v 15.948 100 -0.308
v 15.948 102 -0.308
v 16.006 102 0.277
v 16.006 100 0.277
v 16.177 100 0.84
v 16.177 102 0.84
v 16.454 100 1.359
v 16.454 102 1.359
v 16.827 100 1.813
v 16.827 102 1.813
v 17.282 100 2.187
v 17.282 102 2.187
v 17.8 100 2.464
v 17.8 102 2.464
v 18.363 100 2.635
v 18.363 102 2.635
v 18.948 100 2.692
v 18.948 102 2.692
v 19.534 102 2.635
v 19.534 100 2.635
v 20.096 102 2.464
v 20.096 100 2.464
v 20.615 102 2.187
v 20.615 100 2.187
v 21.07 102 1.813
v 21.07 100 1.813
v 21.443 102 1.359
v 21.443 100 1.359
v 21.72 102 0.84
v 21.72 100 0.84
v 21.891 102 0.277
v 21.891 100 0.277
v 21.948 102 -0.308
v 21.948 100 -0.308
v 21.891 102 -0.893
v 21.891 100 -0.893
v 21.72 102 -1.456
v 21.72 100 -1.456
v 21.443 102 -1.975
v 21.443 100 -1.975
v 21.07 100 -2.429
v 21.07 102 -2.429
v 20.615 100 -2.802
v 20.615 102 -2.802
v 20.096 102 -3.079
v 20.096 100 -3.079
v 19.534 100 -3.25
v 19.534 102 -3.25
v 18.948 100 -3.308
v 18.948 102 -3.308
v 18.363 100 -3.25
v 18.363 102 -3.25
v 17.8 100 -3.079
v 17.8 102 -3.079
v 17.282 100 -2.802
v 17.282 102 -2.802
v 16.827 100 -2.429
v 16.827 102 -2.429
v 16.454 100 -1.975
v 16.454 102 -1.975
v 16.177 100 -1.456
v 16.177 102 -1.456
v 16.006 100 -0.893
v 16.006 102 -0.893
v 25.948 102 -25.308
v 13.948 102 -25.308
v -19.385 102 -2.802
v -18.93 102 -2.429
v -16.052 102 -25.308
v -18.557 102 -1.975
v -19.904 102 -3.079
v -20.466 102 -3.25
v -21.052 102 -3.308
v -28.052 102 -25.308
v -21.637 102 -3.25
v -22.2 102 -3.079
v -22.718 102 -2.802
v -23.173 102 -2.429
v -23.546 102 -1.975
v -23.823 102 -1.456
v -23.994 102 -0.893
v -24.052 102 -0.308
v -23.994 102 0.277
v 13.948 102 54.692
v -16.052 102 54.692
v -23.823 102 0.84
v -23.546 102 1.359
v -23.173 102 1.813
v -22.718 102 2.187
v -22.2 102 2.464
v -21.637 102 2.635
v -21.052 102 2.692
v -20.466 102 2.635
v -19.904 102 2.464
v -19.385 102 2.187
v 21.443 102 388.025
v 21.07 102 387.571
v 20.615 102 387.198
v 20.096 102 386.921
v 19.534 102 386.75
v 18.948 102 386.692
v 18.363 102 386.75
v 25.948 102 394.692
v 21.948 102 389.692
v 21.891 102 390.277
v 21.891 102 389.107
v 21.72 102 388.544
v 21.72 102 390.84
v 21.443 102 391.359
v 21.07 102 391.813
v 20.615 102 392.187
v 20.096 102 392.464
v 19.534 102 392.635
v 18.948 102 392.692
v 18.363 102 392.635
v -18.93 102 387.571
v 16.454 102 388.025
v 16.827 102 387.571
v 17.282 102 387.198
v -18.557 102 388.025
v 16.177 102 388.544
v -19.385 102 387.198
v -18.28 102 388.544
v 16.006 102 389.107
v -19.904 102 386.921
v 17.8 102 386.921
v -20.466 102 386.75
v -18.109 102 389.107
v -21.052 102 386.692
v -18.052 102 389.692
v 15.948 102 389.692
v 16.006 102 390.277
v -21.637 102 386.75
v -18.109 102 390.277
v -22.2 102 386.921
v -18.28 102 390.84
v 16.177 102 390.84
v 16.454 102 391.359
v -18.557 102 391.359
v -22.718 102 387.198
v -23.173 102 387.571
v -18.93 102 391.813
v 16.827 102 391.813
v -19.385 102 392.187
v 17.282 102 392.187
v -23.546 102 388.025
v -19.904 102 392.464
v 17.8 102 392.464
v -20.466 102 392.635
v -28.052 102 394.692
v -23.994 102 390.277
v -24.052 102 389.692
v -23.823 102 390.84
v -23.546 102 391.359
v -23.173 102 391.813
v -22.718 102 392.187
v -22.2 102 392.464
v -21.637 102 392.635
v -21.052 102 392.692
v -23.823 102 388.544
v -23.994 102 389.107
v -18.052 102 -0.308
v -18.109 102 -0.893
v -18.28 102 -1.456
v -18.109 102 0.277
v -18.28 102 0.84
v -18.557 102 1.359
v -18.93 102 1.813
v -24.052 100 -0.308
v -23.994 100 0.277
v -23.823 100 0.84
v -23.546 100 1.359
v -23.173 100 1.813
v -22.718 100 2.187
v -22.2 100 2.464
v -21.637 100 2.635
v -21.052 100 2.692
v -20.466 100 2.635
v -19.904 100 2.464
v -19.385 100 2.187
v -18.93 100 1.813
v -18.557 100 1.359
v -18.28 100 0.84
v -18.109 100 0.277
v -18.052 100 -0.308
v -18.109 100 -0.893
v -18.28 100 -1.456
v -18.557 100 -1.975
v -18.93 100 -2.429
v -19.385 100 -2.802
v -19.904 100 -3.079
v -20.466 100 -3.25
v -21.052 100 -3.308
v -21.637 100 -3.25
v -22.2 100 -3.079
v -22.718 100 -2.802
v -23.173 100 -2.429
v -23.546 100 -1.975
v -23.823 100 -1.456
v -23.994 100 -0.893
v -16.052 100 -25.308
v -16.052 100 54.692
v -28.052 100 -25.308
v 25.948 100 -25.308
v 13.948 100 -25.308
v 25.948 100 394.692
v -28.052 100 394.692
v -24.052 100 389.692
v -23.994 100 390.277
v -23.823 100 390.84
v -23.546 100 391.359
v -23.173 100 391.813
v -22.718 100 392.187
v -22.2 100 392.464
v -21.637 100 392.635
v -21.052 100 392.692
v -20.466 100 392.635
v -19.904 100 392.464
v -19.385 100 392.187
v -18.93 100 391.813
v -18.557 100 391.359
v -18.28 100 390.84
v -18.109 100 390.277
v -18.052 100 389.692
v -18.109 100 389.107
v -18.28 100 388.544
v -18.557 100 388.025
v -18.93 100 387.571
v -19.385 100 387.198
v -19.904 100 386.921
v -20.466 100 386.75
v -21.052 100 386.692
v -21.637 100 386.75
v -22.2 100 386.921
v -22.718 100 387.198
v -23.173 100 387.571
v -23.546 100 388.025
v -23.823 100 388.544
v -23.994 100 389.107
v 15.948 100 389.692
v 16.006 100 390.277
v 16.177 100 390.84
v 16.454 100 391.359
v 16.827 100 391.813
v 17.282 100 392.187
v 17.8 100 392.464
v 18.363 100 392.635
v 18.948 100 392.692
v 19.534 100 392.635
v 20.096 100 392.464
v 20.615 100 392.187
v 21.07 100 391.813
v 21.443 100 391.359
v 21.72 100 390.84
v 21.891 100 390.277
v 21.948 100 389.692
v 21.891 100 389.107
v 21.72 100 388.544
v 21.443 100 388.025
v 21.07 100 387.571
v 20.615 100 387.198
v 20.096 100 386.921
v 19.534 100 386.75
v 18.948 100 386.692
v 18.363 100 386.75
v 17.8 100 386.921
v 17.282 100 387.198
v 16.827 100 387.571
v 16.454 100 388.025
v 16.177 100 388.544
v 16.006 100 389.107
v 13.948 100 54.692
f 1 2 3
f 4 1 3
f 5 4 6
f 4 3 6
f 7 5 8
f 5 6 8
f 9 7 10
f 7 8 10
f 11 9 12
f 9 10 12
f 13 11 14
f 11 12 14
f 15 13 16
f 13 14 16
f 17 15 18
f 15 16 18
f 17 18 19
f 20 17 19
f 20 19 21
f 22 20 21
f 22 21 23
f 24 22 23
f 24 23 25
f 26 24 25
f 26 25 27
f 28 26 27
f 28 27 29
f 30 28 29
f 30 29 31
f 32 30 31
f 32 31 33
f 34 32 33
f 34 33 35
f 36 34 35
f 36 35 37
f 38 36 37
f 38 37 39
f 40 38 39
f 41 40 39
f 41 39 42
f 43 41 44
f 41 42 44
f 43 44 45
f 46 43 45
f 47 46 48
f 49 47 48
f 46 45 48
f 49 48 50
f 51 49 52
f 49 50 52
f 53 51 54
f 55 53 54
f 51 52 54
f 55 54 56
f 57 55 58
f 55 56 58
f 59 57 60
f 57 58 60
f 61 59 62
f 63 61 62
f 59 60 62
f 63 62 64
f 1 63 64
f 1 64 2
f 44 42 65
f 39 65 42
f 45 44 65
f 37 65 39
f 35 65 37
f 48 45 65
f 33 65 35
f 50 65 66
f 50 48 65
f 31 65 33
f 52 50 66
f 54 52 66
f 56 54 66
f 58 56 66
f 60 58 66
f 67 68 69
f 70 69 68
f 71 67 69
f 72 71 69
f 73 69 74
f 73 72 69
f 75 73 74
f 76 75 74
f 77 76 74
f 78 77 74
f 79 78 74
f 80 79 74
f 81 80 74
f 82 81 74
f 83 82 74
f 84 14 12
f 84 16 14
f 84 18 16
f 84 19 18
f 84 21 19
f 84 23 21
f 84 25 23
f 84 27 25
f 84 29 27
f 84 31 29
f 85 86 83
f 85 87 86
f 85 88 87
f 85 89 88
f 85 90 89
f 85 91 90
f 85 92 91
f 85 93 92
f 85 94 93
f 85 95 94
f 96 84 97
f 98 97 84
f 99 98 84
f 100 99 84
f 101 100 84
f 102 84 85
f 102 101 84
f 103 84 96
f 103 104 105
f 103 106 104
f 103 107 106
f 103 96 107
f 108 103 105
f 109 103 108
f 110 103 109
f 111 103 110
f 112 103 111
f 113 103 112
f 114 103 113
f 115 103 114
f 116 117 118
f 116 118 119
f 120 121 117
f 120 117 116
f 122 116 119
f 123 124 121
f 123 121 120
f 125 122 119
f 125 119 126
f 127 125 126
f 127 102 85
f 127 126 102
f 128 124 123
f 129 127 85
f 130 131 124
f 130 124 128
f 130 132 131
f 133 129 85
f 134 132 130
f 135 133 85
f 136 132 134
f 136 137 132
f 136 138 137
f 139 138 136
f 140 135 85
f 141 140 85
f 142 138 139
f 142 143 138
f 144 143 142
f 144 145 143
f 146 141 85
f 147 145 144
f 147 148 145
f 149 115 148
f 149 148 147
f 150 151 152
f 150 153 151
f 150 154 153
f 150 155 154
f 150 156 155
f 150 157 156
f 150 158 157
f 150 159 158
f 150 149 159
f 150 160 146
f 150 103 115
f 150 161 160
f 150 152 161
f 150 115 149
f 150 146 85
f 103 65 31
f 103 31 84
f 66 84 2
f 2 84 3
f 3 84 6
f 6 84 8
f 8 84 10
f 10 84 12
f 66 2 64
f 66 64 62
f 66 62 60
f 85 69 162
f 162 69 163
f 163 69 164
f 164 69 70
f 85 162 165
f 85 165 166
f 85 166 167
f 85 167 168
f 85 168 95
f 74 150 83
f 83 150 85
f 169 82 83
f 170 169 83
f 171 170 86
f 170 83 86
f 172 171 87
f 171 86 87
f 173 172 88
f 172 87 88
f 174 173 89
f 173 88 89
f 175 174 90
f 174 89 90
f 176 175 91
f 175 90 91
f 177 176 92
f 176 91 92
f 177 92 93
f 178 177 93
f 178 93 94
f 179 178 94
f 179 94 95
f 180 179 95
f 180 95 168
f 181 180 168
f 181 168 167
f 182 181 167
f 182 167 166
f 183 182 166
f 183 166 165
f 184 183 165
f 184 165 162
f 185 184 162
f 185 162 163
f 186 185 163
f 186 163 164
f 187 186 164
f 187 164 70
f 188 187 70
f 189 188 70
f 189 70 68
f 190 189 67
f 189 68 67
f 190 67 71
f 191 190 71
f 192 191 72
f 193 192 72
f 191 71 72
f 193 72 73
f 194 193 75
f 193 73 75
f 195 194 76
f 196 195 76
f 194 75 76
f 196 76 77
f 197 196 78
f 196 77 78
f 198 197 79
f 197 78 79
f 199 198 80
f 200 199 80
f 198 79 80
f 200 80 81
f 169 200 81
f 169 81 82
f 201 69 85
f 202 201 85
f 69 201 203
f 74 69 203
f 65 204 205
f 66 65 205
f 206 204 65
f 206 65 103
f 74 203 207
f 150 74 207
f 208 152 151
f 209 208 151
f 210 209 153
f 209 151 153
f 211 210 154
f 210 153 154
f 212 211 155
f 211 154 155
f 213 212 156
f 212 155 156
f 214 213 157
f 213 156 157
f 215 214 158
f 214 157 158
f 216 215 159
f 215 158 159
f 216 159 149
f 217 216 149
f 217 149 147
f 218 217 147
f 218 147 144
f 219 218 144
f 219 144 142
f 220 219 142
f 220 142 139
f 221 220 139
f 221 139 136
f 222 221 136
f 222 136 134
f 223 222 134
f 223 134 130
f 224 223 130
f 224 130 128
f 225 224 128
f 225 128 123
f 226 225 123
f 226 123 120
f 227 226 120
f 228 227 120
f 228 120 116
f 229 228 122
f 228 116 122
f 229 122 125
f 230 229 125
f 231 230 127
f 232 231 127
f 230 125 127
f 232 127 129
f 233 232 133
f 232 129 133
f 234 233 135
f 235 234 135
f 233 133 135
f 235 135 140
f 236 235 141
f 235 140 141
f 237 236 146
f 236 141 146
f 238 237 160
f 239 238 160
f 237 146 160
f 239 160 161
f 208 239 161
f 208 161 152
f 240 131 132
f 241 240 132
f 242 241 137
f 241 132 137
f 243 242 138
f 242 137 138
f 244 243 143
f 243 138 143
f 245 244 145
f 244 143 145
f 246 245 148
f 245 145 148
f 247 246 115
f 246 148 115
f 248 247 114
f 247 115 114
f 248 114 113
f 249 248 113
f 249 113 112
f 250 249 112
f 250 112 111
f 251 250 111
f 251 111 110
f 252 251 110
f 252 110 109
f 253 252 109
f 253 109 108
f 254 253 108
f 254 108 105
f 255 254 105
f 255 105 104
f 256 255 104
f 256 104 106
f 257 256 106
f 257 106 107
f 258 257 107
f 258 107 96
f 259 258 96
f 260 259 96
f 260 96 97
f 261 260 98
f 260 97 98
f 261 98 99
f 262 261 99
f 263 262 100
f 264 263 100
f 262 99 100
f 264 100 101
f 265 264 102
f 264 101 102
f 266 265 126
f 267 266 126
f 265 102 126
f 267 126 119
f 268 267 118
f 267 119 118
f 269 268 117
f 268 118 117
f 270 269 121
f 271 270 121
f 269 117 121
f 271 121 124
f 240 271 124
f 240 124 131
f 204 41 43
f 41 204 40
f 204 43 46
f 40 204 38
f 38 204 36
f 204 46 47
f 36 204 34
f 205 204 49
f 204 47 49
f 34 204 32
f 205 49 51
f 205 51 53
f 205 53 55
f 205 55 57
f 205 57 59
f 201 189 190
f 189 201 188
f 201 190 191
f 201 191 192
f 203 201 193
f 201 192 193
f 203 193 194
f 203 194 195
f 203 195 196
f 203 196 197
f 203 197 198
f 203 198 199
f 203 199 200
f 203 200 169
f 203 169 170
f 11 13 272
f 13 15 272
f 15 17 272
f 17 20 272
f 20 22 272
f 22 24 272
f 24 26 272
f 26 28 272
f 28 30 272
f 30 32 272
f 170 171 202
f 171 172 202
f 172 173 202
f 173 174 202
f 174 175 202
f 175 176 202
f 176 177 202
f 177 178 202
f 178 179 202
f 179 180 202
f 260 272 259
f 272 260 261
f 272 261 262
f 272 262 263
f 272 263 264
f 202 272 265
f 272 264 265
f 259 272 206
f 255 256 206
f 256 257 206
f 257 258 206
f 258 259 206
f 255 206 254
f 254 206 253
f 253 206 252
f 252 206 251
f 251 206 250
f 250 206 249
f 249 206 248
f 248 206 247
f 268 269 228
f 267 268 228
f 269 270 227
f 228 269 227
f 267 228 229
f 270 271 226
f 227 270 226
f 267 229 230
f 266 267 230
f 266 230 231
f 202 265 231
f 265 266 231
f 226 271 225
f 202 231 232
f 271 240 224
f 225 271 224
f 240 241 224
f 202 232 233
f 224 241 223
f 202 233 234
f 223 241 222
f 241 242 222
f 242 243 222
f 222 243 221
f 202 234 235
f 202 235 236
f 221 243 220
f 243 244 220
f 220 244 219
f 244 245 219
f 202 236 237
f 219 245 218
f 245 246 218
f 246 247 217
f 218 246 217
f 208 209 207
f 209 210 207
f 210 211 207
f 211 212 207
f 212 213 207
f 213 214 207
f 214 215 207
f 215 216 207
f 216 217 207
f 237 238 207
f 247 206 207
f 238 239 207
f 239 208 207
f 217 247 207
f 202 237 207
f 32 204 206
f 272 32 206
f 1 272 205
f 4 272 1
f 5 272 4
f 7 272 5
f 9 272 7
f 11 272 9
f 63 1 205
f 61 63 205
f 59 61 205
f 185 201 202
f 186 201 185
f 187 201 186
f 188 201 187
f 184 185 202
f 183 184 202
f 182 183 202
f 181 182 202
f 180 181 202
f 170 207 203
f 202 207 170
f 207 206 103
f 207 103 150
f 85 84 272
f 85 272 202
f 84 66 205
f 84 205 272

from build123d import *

# Parameters (mm, degrees)
SKETCH1_W           = 54
SKETCH1_H           = 420
BOSS_EXTRUDE1_DEPTH = 2
CUT_EXTRUDE1_REACH  = 4
SKETCH2_W           = 30
SKETCH2_H           = 80
CUT_EXTRUDE2_REACH  = 4
SKETCH3_R           = 3


with BuildPart() as part:
    # Sketch1 → Boss-Extrude1 (new body)
    with BuildSketch(Plane(origin=(0, 100, 0), x_dir=(-1, 0, 0), z_dir=(0, 1, 0))):
        with Locations((1.051745534, 184.692172039)):
            Rectangle(SKETCH1_W, SKETCH1_H)
    extrude(amount=BOSS_EXTRUDE1_DEPTH)

    # Sketch2 → Cut-Extrude1 (cut, up to next)
    with BuildSketch(Plane(origin=(0, 102, 0), x_dir=(-1, 0, 0), z_dir=(0, 1, 0)), mode=Mode.PRIVATE) as cut_extrude1_sk1:
        with Locations((1.051745534, 14.692172039)):
            Rectangle(SKETCH2_W, SKETCH2_H)
    cut_extrude1_tool1 = extrude(cut_extrude1_sk1.sketch, amount=-CUT_EXTRUDE1_REACH, mode=Mode.PRIVATE) & part.part
    add(cut_extrude1_tool1.solids().sort_by_distance((-1.051746, 102, 14.692172))[0], mode=Mode.SUBTRACT)

    # Sketch3 → Cut-Extrude2 (cut, up to next)
    with BuildSketch(Plane(origin=(0, 102, 0), x_dir=(-1, 0, 0), z_dir=(0, 1, 0)), mode=Mode.PRIVATE) as cut_extrude2_sk1:
        with Locations((-18.948254466, -0.307827961)):
            Circle(SKETCH3_R)
    cut_extrude2_tool1 = extrude(cut_extrude2_sk1.sketch, amount=-CUT_EXTRUDE2_REACH, mode=Mode.PRIVATE) & part.part
    add(cut_extrude2_tool1.solids().sort_by_distance((18.948254, 102, -0.307828))[0], mode=Mode.SUBTRACT)
    # Sketch3 → Cut-Extrude2 (cut, up to next)
    with BuildSketch(Plane(origin=(0, 102, 0), x_dir=(-1, 0, 0), z_dir=(0, 1, 0)), mode=Mode.PRIVATE) as cut_extrude2_sk2:
        with Locations((21.051745534, -0.307827961)):
            Circle(SKETCH3_R)
    cut_extrude2_tool2 = extrude(cut_extrude2_sk2.sketch, amount=-CUT_EXTRUDE2_REACH, mode=Mode.PRIVATE) & part.part
    add(cut_extrude2_tool2.solids().sort_by_distance((-21.051746, 102, -0.307828))[0], mode=Mode.SUBTRACT)
    # Sketch3 → Cut-Extrude2 (cut, up to next)
    with BuildSketch(Plane(origin=(0, 102, 0), x_dir=(-1, 0, 0), z_dir=(0, 1, 0)), mode=Mode.PRIVATE) as cut_extrude2_sk3:
        with Locations((21.051745534, 389.692172039)):
            Circle(SKETCH3_R)
    cut_extrude2_tool3 = extrude(cut_extrude2_sk3.sketch, amount=-CUT_EXTRUDE2_REACH, mode=Mode.PRIVATE) & part.part
    add(cut_extrude2_tool3.solids().sort_by_distance((-21.051746, 102, 389.692172))[0], mode=Mode.SUBTRACT)
    # Sketch3 → Cut-Extrude2 (cut, up to next)
    with BuildSketch(Plane(origin=(0, 102, 0), x_dir=(-1, 0, 0), z_dir=(0, 1, 0)), mode=Mode.PRIVATE) as cut_extrude2_sk4:
        with Locations((-18.948254466, 389.692172039)):
            Circle(SKETCH3_R)
    cut_extrude2_tool4 = extrude(cut_extrude2_sk4.sketch, amount=-CUT_EXTRUDE2_REACH, mode=Mode.PRIVATE) & part.part
    add(cut_extrude2_tool4.solids().sort_by_distance((18.948254, 102, 389.692172))[0], mode=Mode.SUBTRACT)


solid = part.part
